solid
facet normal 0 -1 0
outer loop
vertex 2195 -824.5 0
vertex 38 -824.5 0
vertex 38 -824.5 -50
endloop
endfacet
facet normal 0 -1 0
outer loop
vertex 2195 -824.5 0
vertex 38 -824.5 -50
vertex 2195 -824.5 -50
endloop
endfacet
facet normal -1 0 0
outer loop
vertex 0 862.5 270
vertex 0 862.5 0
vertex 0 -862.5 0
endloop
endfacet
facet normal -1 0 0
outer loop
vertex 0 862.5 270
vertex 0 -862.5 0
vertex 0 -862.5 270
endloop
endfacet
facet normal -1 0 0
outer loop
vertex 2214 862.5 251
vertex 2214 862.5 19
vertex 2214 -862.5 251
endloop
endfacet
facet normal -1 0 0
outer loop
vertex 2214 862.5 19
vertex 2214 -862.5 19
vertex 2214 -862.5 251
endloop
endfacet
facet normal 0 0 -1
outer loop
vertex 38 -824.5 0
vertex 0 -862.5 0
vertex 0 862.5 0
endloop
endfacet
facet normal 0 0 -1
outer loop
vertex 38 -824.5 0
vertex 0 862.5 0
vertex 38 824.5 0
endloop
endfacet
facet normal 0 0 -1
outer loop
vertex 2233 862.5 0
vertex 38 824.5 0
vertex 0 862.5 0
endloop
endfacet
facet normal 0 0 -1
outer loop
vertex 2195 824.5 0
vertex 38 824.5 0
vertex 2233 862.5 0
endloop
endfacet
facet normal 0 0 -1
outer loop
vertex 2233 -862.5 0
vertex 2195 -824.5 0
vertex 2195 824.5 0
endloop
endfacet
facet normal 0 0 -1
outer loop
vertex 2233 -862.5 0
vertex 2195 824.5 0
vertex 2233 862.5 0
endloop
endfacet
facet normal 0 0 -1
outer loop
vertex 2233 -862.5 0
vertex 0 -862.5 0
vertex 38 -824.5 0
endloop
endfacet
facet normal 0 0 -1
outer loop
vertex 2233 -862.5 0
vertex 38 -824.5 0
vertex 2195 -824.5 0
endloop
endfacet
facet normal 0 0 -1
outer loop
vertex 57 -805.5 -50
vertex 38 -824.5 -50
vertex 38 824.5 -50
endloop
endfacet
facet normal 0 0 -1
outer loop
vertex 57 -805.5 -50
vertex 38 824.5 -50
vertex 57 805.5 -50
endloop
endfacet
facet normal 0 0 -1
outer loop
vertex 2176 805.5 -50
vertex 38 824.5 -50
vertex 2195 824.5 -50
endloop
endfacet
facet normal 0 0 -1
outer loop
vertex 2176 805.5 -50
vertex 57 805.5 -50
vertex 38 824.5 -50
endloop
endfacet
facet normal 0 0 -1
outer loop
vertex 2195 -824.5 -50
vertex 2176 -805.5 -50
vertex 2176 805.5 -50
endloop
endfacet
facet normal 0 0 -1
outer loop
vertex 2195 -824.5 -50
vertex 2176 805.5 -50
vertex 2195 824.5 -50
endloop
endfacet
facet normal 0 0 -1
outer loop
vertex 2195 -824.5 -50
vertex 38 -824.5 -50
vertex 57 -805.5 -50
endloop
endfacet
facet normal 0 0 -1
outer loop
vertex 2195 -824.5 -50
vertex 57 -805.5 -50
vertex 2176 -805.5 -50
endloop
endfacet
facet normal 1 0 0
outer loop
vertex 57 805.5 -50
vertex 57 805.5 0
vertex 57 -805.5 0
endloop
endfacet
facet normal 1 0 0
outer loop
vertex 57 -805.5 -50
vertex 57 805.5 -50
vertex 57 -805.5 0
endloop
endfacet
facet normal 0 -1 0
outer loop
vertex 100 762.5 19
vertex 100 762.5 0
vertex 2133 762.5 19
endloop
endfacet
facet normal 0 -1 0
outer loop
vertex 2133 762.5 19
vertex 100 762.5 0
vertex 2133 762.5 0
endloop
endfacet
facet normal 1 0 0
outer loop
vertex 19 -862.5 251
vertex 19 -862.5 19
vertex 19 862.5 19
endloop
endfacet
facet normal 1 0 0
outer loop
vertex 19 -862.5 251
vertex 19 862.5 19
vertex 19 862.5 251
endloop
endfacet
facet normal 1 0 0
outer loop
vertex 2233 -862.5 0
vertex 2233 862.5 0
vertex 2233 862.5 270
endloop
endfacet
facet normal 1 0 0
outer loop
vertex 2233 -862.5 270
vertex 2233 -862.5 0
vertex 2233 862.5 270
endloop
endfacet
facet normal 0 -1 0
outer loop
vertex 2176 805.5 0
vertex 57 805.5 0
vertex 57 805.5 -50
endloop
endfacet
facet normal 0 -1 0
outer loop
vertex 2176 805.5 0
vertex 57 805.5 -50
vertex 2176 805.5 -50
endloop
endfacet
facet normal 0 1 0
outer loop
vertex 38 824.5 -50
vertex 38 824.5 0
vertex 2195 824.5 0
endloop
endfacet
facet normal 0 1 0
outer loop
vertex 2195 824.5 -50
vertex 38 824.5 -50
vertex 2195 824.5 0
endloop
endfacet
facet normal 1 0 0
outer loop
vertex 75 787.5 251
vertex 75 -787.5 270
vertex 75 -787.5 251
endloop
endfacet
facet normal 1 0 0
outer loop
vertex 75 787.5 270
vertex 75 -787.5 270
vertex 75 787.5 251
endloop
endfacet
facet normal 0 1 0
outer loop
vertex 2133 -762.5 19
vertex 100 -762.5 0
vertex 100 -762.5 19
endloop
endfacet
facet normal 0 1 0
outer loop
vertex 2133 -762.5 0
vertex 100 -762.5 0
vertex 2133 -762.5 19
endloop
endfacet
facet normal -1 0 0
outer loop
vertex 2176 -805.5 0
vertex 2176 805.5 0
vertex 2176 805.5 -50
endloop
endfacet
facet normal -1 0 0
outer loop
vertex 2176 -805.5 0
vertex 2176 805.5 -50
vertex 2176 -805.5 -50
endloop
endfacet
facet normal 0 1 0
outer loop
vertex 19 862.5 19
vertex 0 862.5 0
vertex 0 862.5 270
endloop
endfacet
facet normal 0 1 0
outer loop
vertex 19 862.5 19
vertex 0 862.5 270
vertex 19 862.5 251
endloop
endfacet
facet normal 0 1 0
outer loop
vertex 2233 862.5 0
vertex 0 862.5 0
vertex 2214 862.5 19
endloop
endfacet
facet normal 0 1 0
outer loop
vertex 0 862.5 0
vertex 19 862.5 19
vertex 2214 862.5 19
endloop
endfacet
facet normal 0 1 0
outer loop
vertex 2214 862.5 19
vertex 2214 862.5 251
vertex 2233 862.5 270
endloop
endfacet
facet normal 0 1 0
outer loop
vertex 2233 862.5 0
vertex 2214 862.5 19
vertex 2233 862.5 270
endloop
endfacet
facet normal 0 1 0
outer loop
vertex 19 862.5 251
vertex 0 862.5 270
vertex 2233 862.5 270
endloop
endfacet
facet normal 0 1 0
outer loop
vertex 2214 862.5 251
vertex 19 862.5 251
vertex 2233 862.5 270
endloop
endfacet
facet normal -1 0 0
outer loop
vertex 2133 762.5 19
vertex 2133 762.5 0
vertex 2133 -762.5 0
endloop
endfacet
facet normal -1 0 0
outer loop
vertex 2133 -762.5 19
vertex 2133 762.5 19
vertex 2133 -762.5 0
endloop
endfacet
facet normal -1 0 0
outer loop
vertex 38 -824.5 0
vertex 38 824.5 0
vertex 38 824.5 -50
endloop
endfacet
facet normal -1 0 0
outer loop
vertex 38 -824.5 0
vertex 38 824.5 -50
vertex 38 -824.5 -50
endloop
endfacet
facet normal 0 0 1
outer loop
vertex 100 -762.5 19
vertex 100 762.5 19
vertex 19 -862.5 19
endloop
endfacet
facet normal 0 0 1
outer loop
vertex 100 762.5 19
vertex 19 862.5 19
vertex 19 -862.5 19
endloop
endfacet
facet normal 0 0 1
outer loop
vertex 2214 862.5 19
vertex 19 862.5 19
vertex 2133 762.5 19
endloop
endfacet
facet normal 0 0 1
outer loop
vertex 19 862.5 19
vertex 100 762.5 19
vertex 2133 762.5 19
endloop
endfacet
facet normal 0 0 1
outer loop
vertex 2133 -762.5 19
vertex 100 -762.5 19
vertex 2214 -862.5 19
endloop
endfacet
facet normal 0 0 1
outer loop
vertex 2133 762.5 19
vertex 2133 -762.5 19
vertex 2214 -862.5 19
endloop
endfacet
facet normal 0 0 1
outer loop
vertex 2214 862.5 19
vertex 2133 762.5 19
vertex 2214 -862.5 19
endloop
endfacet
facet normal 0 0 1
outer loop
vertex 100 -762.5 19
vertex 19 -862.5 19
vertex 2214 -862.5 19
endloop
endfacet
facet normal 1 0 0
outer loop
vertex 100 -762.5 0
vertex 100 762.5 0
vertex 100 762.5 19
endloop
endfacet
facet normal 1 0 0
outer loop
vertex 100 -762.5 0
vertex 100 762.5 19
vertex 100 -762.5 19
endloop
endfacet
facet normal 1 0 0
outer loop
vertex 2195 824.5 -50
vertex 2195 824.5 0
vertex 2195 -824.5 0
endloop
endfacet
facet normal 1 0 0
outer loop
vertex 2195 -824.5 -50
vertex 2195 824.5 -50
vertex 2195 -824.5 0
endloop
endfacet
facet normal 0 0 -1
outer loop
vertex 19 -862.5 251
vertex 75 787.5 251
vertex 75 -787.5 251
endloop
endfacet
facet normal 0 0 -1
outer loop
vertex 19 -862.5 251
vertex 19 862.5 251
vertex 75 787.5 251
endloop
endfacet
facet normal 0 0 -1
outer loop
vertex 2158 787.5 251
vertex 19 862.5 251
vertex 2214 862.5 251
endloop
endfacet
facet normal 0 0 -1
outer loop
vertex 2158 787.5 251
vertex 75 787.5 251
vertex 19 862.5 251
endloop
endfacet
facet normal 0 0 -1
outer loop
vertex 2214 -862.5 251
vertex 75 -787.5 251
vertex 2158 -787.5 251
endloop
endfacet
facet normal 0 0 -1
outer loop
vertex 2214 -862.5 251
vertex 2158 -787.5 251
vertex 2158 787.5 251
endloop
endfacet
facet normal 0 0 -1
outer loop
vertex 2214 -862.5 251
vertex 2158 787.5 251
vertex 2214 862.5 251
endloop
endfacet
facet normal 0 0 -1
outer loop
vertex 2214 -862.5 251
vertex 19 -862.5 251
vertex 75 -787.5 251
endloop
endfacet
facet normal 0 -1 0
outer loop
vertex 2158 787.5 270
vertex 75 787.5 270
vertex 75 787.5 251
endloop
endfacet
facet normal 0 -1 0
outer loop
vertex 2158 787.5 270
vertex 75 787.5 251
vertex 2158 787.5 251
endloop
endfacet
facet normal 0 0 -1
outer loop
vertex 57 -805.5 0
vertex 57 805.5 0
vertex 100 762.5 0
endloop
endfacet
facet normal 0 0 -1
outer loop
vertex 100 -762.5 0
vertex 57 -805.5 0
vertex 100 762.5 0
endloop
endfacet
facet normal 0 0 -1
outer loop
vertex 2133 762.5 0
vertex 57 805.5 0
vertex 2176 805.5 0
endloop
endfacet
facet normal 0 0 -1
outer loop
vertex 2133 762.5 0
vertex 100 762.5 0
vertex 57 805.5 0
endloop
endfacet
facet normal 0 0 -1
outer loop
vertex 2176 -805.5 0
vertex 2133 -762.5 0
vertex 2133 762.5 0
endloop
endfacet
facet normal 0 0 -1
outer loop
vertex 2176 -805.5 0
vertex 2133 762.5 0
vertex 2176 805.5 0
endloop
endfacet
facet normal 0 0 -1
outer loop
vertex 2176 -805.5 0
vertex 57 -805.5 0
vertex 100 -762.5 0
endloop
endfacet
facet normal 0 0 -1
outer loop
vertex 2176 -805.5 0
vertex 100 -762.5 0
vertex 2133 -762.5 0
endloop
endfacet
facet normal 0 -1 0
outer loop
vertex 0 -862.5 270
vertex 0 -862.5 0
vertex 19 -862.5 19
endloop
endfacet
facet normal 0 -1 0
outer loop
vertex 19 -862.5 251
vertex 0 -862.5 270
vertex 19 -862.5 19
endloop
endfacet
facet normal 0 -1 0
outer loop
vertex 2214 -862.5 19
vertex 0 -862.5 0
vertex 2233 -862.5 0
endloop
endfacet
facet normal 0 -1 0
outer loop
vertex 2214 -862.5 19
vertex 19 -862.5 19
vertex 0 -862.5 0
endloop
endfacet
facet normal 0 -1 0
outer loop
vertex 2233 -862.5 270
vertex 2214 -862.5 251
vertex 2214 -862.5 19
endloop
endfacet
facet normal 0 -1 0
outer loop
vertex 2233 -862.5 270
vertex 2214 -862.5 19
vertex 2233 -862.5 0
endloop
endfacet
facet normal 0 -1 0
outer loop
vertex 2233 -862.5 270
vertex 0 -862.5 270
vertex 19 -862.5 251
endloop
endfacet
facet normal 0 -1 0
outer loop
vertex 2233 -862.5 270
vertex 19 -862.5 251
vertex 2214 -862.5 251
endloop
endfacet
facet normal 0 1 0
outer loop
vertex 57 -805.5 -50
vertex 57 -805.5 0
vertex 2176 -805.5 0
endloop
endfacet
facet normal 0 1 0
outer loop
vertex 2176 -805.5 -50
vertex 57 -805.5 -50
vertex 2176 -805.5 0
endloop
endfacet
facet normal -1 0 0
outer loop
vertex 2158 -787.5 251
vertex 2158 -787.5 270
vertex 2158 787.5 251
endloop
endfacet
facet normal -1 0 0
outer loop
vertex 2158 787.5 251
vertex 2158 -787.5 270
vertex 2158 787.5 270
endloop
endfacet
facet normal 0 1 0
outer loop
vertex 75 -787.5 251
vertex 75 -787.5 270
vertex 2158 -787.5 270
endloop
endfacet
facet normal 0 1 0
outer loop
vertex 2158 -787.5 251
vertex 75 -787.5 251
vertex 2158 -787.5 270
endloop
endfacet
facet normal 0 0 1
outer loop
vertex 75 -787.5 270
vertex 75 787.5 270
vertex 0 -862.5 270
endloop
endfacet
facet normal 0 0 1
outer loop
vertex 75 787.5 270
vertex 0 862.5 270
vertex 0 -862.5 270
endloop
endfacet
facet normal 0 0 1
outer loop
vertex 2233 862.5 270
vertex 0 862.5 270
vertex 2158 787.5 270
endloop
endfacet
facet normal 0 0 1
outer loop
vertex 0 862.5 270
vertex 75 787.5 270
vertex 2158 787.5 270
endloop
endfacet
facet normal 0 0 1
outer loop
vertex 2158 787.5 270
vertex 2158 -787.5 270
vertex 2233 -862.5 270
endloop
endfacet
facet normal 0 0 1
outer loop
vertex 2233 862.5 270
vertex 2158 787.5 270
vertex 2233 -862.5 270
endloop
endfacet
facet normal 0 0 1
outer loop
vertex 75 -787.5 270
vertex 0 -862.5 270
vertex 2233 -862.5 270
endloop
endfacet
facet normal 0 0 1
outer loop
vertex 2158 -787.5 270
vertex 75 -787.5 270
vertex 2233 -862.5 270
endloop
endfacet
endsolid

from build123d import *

# Parameters (mm, degrees)
F0_W     = 2233
F0_H     = 270
F0_W_2   = 2195
F0_H_2   = 232
F1_DEPTH = 862.5
F2_W     = 2083
F2_H     = 1575
F3_DEPTH = 38
F4_W     = 2157
F4_H     = 1649
F4_W_2   = 2119
F4_H_2   = 1611
F5_DEPTH = 50
F6_W     = 2033
F6_H     = 1525
F7_DEPTH = 25


with BuildPart() as f1:
    # F0 (on Front) → F1 (new body, symmetric)
    with BuildSketch(Plane.XZ):
        with Locations((1116.5, 135)):
            Rectangle(F0_W, F0_H)
        with Locations((1116.5, 135)):
            Rectangle(F0_W_2, F0_H_2, mode=Mode.SUBTRACT)
    extrude(amount=F1_DEPTH, both=True)

    # F2 (on face) → F3 (cut)
    with BuildSketch(Plane.XY.offset(270)):
        with Locations((1116.5, 0)):
            Rectangle(F2_W, F2_H)
    extrude(amount=-F3_DEPTH, mode=Mode.SUBTRACT)

    # F4 (on face) → F5 (join)
    with BuildSketch(Plane(origin=(0, 0, 0), x_dir=(1, 0, 0), z_dir=(0, 0, -1))):
        with Locations((1116.5, 0)):
            Rectangle(F4_W, F4_H)
        with Locations((1116.5, 0)):
            Rectangle(F4_W_2, F4_H_2, mode=Mode.SUBTRACT)
    extrude(amount=F5_DEPTH)

    # F6 (on face) → F7 (cut)
    with BuildSketch(Plane(origin=(0, 0, 0), x_dir=(1, 0, 0), z_dir=(0, 0, -1))):
        with Locations((1116.5, 0)):
            Rectangle(F6_W, F6_H)
    extrude(amount=-F7_DEPTH, mode=Mode.SUBTRACT)


solid = f1.part
